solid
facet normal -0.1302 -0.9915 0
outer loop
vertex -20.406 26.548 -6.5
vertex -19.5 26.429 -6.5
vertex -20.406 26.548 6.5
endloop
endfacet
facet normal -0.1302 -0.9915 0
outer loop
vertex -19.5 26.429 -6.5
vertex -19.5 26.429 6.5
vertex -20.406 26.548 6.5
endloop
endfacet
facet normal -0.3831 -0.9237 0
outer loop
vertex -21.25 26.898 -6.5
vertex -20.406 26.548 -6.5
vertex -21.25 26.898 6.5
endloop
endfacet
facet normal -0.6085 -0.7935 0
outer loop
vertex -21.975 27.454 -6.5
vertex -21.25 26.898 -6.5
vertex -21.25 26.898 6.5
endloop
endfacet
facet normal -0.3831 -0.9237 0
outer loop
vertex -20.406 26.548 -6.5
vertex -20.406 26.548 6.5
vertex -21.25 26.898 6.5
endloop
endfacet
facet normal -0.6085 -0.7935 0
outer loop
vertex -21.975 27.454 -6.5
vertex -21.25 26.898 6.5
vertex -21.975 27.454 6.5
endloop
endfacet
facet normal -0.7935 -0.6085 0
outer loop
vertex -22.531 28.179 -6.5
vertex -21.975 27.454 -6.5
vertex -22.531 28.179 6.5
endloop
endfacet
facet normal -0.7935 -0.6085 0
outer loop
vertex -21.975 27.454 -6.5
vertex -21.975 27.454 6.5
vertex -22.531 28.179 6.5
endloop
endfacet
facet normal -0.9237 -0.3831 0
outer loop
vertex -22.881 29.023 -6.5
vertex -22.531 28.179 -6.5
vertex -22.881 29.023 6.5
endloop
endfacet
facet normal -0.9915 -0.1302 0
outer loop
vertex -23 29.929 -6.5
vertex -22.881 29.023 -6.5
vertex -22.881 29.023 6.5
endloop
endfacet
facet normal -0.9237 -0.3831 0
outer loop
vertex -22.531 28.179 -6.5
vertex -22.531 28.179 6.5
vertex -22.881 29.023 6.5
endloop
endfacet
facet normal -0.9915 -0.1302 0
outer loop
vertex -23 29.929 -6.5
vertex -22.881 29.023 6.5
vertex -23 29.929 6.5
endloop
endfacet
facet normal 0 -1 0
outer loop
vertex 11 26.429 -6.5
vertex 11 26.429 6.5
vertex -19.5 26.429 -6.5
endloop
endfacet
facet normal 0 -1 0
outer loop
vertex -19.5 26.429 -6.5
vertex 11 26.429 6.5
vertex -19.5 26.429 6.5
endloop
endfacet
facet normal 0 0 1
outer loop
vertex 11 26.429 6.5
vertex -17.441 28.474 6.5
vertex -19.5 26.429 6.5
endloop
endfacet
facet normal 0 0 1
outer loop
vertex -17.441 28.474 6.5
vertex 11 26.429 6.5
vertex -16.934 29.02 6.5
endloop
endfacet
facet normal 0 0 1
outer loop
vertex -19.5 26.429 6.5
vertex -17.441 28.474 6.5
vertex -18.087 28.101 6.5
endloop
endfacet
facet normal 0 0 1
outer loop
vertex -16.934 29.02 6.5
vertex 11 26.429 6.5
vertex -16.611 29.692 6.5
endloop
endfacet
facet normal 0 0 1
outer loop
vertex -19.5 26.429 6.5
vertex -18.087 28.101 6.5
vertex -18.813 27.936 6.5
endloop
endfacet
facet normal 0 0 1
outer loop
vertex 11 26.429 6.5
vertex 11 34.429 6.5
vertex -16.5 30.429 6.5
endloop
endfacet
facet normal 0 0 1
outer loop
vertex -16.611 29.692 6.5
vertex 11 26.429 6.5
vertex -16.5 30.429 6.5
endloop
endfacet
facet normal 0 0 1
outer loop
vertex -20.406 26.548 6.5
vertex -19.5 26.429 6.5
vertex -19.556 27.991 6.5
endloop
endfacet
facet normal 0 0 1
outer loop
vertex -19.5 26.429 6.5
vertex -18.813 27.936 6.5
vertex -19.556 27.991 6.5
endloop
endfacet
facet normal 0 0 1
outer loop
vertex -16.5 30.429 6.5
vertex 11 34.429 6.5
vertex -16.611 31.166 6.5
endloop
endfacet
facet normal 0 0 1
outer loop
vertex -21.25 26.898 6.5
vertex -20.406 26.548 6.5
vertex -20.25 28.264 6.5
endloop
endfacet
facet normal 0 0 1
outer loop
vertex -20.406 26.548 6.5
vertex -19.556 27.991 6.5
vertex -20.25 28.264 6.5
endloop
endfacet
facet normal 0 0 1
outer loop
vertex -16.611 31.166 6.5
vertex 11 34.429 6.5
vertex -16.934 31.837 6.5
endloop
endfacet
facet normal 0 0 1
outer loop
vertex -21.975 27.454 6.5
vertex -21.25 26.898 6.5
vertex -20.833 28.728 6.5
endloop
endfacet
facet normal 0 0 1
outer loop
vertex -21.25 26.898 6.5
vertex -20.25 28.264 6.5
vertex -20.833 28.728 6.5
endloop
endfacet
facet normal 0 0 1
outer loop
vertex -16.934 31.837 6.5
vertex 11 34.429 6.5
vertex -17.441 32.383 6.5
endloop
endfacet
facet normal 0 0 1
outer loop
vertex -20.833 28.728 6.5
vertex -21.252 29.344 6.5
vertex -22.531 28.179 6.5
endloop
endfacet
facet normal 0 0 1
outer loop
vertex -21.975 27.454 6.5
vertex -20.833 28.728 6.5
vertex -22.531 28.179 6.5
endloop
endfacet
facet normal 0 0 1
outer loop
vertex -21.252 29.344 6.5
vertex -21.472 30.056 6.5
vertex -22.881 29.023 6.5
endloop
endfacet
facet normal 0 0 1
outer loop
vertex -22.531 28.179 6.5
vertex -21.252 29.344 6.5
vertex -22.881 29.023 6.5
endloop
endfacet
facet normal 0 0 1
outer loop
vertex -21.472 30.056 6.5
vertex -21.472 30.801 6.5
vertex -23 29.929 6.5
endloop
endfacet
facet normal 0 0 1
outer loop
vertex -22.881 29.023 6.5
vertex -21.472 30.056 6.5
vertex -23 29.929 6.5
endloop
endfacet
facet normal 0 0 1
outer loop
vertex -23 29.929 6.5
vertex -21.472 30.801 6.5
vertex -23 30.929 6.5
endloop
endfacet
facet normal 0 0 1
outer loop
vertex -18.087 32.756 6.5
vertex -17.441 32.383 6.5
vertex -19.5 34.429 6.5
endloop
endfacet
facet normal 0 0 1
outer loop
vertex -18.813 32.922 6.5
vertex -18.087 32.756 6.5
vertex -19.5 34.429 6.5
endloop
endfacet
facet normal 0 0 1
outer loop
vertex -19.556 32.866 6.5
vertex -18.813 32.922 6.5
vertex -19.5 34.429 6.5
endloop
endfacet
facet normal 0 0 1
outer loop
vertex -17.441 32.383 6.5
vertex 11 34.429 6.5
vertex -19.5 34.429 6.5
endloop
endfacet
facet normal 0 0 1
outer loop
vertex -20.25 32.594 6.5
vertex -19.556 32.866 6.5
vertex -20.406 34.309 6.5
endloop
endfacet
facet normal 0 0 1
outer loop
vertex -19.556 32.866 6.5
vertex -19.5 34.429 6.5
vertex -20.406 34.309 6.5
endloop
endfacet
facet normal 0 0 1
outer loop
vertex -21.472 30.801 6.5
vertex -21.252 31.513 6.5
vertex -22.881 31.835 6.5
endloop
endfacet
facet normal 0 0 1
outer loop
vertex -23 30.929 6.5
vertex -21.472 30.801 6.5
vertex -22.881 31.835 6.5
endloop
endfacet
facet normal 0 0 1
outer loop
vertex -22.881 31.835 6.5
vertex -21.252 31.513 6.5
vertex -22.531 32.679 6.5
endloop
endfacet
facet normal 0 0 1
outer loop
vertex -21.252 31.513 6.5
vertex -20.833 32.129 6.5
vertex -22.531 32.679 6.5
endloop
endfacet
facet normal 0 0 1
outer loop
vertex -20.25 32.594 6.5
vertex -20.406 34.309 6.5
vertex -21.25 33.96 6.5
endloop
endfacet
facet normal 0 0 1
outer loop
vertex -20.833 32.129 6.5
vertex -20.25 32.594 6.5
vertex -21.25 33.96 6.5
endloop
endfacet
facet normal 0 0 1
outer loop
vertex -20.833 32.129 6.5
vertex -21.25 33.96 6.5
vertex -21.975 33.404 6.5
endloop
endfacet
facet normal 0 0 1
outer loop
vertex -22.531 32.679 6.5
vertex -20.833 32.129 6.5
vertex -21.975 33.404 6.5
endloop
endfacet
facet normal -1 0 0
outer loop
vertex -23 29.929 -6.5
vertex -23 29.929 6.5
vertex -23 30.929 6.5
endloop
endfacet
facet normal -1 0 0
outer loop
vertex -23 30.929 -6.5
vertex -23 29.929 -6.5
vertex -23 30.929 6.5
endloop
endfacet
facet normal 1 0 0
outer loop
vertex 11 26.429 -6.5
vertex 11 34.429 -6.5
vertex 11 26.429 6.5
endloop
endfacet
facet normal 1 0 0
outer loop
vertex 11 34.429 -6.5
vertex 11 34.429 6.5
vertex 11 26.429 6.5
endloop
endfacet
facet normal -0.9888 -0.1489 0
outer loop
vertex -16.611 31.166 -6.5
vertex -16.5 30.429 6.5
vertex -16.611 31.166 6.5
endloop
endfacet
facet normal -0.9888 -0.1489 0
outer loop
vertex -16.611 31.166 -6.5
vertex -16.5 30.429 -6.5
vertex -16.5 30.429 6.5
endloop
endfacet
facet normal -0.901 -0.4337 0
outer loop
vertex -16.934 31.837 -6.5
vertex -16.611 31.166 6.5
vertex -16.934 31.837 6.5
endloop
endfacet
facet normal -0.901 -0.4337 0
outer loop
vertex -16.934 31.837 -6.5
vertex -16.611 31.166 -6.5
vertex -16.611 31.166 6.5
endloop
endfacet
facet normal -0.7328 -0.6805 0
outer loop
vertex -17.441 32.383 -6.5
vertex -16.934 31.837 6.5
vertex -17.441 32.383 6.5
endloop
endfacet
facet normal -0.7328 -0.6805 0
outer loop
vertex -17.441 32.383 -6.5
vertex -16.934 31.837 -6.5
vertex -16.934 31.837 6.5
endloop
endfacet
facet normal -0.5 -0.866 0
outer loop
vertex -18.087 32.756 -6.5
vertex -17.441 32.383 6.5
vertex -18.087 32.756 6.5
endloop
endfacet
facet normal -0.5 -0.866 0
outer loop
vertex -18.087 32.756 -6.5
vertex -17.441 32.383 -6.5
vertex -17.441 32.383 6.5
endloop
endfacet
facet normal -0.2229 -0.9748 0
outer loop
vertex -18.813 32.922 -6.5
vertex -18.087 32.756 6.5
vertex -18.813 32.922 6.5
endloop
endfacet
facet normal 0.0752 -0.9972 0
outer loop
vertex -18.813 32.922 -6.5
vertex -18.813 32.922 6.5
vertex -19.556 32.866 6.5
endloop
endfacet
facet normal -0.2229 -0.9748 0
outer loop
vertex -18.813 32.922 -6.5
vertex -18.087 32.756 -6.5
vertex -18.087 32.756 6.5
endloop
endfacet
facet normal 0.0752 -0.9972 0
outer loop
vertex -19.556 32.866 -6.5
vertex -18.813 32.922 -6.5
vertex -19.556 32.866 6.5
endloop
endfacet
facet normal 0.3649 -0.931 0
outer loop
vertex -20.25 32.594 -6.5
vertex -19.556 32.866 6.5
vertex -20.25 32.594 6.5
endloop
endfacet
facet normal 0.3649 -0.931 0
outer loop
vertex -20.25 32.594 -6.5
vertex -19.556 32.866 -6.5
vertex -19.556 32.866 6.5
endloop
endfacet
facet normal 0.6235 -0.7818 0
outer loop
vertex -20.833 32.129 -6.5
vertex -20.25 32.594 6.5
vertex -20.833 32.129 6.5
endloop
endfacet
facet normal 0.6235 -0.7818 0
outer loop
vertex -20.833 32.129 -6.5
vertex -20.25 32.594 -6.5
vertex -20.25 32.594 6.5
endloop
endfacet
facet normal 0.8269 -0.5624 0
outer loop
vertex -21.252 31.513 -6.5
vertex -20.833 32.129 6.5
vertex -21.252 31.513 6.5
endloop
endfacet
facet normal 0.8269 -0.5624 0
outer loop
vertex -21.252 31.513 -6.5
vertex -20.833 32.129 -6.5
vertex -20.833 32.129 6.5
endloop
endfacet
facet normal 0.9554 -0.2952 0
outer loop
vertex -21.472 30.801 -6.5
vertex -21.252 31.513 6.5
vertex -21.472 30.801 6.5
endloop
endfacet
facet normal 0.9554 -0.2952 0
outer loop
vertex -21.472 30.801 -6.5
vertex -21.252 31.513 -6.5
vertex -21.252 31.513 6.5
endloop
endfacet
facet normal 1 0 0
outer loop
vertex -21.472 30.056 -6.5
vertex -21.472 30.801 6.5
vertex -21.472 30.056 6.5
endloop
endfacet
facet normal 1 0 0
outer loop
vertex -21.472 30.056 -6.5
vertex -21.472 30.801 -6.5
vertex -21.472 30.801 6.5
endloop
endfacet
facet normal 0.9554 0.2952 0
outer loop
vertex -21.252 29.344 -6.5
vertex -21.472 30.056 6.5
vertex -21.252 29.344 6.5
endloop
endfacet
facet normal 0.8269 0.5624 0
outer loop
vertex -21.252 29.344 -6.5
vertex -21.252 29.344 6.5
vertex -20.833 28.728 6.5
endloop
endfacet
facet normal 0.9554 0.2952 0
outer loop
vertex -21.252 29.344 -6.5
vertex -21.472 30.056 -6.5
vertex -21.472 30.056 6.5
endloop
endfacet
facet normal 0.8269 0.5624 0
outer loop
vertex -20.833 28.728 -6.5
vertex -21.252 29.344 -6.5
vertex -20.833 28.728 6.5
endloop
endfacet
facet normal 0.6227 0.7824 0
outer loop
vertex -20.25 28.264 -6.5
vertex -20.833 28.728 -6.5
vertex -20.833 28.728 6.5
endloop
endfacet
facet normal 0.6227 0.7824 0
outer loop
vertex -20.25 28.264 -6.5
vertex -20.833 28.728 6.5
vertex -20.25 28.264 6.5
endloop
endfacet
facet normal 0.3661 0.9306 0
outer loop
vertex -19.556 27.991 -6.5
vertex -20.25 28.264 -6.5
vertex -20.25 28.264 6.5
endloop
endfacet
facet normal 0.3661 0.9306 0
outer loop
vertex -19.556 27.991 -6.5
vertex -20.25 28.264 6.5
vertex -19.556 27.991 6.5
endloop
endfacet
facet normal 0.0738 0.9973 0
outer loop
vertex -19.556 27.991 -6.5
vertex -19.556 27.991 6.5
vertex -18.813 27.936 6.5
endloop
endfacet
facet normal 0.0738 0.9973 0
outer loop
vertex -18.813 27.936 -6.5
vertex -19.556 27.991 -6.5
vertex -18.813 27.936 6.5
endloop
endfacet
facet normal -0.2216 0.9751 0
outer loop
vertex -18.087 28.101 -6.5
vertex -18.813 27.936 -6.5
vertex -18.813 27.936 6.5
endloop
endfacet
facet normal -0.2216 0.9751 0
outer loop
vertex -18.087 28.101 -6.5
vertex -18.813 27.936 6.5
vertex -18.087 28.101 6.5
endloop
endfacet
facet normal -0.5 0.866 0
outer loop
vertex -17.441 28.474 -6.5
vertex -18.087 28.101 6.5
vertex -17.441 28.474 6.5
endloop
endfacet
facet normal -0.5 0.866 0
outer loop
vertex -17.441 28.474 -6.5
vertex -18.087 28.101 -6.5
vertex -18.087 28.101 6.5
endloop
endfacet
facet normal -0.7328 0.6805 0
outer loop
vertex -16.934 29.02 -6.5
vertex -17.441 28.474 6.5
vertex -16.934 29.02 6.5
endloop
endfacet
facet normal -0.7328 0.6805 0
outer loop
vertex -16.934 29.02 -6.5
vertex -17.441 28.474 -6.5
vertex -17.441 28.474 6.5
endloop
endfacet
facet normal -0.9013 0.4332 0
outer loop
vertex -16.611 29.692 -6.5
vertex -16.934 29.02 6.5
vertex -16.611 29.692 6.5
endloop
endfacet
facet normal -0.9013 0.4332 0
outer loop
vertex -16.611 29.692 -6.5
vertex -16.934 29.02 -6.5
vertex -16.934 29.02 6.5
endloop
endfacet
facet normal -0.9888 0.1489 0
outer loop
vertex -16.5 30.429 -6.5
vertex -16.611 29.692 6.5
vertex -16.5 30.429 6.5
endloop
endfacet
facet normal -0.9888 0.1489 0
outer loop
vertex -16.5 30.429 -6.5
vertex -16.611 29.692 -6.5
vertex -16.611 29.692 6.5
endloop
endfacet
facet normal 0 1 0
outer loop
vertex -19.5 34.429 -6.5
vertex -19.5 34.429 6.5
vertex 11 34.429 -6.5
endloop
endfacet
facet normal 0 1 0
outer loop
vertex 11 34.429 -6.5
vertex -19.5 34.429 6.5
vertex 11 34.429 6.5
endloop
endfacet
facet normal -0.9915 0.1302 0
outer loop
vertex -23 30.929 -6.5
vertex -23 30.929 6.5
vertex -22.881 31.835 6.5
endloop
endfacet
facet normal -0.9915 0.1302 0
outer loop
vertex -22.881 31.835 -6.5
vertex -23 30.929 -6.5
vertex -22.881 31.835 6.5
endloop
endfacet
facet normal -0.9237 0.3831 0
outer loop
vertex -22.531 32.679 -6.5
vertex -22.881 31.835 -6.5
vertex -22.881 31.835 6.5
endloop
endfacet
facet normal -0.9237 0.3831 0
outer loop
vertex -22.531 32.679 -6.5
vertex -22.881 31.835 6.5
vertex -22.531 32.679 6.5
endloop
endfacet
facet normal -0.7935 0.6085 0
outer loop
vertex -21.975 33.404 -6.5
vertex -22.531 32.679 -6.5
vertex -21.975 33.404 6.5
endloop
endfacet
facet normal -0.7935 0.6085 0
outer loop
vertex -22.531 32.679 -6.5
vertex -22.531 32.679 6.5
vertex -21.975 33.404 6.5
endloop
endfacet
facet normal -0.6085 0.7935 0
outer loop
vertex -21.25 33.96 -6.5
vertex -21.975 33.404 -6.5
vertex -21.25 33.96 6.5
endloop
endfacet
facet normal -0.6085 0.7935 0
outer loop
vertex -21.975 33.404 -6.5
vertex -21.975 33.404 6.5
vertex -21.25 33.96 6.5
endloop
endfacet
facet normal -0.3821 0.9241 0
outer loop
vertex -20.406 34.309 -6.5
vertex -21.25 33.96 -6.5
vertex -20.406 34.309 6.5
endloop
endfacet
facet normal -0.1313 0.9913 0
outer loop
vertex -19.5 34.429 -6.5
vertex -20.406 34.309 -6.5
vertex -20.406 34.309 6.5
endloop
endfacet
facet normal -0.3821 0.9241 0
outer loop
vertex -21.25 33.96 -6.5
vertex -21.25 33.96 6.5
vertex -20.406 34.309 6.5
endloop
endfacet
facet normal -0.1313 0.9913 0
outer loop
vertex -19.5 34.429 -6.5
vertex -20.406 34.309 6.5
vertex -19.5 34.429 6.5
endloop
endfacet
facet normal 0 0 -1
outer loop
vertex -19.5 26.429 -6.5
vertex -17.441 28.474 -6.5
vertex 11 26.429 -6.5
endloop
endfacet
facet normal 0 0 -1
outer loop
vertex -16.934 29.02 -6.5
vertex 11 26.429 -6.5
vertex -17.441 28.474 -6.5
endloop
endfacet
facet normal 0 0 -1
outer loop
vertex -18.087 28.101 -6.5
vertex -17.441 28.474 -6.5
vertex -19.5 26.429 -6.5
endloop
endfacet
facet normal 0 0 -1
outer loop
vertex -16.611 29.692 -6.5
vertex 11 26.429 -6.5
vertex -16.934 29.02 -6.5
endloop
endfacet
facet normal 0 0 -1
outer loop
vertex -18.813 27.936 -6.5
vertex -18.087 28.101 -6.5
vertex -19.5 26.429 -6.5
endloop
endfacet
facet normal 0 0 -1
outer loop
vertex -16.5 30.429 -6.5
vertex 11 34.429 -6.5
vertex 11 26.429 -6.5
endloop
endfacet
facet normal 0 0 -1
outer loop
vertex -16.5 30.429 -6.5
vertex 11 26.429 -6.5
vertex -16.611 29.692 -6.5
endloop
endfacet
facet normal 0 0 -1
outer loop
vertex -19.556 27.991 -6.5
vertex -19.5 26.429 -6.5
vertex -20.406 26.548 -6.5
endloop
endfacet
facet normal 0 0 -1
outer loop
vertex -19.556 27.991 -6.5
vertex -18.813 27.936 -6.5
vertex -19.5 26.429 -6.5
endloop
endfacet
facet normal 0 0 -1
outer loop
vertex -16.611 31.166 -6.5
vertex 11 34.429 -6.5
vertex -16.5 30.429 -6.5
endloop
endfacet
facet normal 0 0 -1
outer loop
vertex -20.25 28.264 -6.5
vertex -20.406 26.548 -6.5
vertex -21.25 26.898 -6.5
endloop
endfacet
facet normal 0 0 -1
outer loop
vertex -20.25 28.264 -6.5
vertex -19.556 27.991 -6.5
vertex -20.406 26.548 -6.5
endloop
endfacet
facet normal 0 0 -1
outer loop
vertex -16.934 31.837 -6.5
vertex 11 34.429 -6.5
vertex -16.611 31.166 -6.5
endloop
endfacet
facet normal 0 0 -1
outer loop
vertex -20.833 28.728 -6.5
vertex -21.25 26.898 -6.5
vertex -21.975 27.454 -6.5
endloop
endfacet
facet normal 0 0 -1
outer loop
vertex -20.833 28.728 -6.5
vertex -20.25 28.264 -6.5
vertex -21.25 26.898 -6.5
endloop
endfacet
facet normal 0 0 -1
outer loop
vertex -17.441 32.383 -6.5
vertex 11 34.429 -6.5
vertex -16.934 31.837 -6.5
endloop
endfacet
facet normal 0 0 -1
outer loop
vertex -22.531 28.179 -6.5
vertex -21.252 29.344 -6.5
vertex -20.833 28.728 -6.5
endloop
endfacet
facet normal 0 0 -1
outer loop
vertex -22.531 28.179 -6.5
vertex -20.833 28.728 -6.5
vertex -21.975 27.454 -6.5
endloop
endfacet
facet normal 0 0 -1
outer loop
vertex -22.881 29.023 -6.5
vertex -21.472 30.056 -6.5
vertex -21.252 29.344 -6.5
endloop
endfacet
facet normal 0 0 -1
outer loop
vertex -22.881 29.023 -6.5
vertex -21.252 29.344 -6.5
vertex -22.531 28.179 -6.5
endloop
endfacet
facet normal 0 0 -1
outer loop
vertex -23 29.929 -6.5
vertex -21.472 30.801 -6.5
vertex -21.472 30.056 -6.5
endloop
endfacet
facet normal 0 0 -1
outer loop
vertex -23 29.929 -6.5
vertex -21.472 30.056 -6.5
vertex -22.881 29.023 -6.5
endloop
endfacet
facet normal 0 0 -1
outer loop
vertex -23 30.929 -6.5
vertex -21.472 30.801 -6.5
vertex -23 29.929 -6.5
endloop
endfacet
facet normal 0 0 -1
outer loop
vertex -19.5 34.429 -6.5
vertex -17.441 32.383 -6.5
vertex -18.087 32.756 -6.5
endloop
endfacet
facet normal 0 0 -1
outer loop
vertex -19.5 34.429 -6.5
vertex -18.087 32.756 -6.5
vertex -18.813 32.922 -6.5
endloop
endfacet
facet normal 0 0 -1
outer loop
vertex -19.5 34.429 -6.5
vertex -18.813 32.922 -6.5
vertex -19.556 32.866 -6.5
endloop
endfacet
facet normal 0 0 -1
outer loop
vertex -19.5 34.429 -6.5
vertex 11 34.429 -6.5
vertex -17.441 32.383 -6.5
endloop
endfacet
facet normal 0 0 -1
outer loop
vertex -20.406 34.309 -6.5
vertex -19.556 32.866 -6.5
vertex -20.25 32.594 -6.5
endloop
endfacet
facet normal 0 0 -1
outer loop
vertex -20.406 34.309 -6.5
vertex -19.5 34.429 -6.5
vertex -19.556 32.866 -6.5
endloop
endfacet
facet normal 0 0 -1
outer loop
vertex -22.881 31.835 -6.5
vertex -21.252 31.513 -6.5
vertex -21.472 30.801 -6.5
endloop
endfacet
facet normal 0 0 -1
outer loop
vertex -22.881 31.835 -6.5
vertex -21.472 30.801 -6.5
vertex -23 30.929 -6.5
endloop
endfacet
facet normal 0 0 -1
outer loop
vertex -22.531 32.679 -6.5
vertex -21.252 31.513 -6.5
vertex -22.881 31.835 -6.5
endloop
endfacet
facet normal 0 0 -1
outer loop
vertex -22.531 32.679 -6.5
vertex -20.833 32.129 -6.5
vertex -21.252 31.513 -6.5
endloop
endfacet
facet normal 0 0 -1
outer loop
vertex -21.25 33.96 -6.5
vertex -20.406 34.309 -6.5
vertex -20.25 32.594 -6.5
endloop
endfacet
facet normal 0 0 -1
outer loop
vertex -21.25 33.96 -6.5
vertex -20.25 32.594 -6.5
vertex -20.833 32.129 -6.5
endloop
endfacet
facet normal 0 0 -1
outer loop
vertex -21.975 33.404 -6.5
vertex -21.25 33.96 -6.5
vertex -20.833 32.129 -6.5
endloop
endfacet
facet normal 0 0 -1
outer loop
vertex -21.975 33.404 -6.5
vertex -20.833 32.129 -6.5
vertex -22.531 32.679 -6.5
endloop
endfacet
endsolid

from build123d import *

# Parameters (mm, degrees)
SKETCH1_R           = 2.5
BOSS_EXTRUDE1_DEPTH = 6.5


with BuildPart() as part:
    # Sketch1 → Boss-Extrude1 (new body, symmetric)
    with BuildSketch(Plane.XY):
        with BuildLine():
            Line((-19.5, 34.428638458), (11, 34.428638458))
            Line((11, 34.428638458), (11, 26.428638458))
            Line((11, 26.428638458), (-19.5, 26.428638458))
            ThreePointArc((-19.5, 26.428638458), (-21.974873734, 27.453764724), (-23, 29.928638458))
            Line((-23, 29.928638458), (-23, 30.928638458))
            ThreePointArc((-23, 30.928638458), (-21.974873734, 33.403512192), (-19.5, 34.428638458))
        make_face()
        with Locations((-19, 30.428638458)):
            Circle(SKETCH1_R, mode=Mode.SUBTRACT)
    extrude(amount=BOSS_EXTRUDE1_DEPTH, both=True)


solid = part.part
